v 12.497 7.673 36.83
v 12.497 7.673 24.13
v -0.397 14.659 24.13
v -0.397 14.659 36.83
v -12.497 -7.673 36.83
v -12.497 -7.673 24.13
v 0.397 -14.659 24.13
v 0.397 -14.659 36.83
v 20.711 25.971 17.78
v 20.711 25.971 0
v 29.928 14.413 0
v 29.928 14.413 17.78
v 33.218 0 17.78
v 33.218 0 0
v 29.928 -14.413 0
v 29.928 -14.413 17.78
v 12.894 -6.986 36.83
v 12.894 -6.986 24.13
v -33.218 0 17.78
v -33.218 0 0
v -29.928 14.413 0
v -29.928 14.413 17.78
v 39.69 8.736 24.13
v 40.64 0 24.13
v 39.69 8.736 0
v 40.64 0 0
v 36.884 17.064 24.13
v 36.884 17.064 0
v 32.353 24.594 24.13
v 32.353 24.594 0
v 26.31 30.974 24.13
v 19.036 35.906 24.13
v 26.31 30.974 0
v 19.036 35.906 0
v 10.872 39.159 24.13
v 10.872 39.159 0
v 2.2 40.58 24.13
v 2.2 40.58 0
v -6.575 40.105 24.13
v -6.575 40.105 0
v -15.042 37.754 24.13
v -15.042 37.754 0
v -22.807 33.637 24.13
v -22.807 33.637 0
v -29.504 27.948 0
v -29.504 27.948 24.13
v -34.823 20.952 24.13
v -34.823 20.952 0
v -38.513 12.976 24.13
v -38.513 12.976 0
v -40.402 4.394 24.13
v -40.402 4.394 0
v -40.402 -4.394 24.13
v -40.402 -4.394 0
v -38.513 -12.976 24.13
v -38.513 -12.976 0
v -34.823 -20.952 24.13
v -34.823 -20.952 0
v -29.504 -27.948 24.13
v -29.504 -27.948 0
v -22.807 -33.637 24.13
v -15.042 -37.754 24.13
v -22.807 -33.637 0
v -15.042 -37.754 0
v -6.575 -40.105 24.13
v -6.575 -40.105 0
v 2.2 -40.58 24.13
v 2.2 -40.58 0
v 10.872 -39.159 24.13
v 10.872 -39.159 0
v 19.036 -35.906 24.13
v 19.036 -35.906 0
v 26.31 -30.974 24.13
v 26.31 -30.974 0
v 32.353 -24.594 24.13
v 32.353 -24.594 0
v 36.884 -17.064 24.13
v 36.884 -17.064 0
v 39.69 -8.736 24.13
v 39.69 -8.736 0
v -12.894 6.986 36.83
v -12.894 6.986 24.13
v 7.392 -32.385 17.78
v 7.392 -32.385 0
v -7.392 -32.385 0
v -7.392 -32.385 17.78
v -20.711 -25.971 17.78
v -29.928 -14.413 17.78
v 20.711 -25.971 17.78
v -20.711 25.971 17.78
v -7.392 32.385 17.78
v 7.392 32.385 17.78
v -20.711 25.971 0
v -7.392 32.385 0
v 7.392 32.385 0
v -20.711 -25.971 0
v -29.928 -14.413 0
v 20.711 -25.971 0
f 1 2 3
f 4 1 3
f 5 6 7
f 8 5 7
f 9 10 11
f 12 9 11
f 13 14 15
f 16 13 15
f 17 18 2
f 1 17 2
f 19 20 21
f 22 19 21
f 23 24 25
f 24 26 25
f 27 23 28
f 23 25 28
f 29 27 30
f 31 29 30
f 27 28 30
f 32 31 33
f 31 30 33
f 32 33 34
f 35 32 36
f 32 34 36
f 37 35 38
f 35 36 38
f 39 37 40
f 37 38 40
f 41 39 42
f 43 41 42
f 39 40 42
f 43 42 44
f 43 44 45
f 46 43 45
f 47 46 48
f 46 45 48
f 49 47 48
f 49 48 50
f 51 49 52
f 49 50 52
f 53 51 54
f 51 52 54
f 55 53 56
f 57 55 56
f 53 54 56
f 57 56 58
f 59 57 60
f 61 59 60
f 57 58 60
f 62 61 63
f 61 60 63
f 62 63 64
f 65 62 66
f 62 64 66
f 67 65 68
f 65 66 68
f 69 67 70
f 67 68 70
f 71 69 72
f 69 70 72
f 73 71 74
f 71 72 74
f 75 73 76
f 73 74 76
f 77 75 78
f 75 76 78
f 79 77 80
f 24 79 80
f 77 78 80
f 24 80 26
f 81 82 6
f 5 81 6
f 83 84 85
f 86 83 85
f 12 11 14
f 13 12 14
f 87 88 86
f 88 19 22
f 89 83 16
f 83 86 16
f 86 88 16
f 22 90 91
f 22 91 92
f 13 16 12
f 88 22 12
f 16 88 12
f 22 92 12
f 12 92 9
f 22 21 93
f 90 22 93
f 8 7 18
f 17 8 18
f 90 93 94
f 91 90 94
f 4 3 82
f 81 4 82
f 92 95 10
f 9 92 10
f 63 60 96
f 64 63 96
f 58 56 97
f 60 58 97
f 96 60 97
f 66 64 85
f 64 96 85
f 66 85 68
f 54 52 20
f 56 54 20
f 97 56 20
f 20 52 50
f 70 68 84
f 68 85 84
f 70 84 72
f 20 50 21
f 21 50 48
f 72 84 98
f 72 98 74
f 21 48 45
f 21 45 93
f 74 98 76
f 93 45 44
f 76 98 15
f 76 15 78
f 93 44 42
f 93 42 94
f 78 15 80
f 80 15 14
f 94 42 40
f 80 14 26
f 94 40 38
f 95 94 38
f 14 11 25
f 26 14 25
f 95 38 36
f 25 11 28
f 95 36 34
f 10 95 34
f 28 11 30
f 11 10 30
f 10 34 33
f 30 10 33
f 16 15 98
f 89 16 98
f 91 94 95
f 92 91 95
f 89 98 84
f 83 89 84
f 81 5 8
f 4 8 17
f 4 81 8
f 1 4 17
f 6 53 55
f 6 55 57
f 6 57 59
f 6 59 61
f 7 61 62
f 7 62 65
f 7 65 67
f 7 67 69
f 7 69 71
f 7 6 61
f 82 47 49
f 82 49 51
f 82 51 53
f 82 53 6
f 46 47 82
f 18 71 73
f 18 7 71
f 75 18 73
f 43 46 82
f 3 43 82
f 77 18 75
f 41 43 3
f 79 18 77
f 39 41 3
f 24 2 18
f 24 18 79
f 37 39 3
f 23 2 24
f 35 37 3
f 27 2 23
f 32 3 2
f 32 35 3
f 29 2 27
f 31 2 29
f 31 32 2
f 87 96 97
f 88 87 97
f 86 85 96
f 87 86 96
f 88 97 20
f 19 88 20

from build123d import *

# Parameters (mm, degrees)
F0_R     = 40.64
F1_DEPTH = 17.78
F2_R     = 40.64
F3_DEPTH = 6.35
F5_DEPTH = 12.7


with BuildPart() as f1:
    # F0 (on Top) → F1 (new body)
    with BuildSketch(Plane.XY):
        Circle(F0_R)
        Polygon((7.391665, -32.385), (-7.391665, -32.385), (-20.710985, -25.970754), (-29.92824, -14.412681), (-33.217841, 0), (-29.92824, 14.412681), (-20.710985, 25.970754), (-7.391665, 32.385), (7.391665, 32.385), (20.710985, 25.970754), (29.92824, 14.412681), (33.217841, 0), (29.92824, -14.412681), (20.710985, -25.970754), align=None, mode=Mode.SUBTRACT)
    extrude(amount=F1_DEPTH)

    # F2 (on face) → F3 (join)
    with BuildSketch(Plane.XY.offset(17.78)):
        Circle(F2_R)
    extrude(amount=F3_DEPTH)

    # F4 (on face) → F5 (join)
    with BuildSketch(Plane.XY.offset(24.13)):
        Polygon((12.497005, 7.673213), (-0.396695, 14.65933), (-12.8937, 6.986117), (-12.497005, -7.673213), (0.396695, -14.65933), (12.8937, -6.986117), align=None)
    extrude(amount=F5_DEPTH)


solid = f1.part
